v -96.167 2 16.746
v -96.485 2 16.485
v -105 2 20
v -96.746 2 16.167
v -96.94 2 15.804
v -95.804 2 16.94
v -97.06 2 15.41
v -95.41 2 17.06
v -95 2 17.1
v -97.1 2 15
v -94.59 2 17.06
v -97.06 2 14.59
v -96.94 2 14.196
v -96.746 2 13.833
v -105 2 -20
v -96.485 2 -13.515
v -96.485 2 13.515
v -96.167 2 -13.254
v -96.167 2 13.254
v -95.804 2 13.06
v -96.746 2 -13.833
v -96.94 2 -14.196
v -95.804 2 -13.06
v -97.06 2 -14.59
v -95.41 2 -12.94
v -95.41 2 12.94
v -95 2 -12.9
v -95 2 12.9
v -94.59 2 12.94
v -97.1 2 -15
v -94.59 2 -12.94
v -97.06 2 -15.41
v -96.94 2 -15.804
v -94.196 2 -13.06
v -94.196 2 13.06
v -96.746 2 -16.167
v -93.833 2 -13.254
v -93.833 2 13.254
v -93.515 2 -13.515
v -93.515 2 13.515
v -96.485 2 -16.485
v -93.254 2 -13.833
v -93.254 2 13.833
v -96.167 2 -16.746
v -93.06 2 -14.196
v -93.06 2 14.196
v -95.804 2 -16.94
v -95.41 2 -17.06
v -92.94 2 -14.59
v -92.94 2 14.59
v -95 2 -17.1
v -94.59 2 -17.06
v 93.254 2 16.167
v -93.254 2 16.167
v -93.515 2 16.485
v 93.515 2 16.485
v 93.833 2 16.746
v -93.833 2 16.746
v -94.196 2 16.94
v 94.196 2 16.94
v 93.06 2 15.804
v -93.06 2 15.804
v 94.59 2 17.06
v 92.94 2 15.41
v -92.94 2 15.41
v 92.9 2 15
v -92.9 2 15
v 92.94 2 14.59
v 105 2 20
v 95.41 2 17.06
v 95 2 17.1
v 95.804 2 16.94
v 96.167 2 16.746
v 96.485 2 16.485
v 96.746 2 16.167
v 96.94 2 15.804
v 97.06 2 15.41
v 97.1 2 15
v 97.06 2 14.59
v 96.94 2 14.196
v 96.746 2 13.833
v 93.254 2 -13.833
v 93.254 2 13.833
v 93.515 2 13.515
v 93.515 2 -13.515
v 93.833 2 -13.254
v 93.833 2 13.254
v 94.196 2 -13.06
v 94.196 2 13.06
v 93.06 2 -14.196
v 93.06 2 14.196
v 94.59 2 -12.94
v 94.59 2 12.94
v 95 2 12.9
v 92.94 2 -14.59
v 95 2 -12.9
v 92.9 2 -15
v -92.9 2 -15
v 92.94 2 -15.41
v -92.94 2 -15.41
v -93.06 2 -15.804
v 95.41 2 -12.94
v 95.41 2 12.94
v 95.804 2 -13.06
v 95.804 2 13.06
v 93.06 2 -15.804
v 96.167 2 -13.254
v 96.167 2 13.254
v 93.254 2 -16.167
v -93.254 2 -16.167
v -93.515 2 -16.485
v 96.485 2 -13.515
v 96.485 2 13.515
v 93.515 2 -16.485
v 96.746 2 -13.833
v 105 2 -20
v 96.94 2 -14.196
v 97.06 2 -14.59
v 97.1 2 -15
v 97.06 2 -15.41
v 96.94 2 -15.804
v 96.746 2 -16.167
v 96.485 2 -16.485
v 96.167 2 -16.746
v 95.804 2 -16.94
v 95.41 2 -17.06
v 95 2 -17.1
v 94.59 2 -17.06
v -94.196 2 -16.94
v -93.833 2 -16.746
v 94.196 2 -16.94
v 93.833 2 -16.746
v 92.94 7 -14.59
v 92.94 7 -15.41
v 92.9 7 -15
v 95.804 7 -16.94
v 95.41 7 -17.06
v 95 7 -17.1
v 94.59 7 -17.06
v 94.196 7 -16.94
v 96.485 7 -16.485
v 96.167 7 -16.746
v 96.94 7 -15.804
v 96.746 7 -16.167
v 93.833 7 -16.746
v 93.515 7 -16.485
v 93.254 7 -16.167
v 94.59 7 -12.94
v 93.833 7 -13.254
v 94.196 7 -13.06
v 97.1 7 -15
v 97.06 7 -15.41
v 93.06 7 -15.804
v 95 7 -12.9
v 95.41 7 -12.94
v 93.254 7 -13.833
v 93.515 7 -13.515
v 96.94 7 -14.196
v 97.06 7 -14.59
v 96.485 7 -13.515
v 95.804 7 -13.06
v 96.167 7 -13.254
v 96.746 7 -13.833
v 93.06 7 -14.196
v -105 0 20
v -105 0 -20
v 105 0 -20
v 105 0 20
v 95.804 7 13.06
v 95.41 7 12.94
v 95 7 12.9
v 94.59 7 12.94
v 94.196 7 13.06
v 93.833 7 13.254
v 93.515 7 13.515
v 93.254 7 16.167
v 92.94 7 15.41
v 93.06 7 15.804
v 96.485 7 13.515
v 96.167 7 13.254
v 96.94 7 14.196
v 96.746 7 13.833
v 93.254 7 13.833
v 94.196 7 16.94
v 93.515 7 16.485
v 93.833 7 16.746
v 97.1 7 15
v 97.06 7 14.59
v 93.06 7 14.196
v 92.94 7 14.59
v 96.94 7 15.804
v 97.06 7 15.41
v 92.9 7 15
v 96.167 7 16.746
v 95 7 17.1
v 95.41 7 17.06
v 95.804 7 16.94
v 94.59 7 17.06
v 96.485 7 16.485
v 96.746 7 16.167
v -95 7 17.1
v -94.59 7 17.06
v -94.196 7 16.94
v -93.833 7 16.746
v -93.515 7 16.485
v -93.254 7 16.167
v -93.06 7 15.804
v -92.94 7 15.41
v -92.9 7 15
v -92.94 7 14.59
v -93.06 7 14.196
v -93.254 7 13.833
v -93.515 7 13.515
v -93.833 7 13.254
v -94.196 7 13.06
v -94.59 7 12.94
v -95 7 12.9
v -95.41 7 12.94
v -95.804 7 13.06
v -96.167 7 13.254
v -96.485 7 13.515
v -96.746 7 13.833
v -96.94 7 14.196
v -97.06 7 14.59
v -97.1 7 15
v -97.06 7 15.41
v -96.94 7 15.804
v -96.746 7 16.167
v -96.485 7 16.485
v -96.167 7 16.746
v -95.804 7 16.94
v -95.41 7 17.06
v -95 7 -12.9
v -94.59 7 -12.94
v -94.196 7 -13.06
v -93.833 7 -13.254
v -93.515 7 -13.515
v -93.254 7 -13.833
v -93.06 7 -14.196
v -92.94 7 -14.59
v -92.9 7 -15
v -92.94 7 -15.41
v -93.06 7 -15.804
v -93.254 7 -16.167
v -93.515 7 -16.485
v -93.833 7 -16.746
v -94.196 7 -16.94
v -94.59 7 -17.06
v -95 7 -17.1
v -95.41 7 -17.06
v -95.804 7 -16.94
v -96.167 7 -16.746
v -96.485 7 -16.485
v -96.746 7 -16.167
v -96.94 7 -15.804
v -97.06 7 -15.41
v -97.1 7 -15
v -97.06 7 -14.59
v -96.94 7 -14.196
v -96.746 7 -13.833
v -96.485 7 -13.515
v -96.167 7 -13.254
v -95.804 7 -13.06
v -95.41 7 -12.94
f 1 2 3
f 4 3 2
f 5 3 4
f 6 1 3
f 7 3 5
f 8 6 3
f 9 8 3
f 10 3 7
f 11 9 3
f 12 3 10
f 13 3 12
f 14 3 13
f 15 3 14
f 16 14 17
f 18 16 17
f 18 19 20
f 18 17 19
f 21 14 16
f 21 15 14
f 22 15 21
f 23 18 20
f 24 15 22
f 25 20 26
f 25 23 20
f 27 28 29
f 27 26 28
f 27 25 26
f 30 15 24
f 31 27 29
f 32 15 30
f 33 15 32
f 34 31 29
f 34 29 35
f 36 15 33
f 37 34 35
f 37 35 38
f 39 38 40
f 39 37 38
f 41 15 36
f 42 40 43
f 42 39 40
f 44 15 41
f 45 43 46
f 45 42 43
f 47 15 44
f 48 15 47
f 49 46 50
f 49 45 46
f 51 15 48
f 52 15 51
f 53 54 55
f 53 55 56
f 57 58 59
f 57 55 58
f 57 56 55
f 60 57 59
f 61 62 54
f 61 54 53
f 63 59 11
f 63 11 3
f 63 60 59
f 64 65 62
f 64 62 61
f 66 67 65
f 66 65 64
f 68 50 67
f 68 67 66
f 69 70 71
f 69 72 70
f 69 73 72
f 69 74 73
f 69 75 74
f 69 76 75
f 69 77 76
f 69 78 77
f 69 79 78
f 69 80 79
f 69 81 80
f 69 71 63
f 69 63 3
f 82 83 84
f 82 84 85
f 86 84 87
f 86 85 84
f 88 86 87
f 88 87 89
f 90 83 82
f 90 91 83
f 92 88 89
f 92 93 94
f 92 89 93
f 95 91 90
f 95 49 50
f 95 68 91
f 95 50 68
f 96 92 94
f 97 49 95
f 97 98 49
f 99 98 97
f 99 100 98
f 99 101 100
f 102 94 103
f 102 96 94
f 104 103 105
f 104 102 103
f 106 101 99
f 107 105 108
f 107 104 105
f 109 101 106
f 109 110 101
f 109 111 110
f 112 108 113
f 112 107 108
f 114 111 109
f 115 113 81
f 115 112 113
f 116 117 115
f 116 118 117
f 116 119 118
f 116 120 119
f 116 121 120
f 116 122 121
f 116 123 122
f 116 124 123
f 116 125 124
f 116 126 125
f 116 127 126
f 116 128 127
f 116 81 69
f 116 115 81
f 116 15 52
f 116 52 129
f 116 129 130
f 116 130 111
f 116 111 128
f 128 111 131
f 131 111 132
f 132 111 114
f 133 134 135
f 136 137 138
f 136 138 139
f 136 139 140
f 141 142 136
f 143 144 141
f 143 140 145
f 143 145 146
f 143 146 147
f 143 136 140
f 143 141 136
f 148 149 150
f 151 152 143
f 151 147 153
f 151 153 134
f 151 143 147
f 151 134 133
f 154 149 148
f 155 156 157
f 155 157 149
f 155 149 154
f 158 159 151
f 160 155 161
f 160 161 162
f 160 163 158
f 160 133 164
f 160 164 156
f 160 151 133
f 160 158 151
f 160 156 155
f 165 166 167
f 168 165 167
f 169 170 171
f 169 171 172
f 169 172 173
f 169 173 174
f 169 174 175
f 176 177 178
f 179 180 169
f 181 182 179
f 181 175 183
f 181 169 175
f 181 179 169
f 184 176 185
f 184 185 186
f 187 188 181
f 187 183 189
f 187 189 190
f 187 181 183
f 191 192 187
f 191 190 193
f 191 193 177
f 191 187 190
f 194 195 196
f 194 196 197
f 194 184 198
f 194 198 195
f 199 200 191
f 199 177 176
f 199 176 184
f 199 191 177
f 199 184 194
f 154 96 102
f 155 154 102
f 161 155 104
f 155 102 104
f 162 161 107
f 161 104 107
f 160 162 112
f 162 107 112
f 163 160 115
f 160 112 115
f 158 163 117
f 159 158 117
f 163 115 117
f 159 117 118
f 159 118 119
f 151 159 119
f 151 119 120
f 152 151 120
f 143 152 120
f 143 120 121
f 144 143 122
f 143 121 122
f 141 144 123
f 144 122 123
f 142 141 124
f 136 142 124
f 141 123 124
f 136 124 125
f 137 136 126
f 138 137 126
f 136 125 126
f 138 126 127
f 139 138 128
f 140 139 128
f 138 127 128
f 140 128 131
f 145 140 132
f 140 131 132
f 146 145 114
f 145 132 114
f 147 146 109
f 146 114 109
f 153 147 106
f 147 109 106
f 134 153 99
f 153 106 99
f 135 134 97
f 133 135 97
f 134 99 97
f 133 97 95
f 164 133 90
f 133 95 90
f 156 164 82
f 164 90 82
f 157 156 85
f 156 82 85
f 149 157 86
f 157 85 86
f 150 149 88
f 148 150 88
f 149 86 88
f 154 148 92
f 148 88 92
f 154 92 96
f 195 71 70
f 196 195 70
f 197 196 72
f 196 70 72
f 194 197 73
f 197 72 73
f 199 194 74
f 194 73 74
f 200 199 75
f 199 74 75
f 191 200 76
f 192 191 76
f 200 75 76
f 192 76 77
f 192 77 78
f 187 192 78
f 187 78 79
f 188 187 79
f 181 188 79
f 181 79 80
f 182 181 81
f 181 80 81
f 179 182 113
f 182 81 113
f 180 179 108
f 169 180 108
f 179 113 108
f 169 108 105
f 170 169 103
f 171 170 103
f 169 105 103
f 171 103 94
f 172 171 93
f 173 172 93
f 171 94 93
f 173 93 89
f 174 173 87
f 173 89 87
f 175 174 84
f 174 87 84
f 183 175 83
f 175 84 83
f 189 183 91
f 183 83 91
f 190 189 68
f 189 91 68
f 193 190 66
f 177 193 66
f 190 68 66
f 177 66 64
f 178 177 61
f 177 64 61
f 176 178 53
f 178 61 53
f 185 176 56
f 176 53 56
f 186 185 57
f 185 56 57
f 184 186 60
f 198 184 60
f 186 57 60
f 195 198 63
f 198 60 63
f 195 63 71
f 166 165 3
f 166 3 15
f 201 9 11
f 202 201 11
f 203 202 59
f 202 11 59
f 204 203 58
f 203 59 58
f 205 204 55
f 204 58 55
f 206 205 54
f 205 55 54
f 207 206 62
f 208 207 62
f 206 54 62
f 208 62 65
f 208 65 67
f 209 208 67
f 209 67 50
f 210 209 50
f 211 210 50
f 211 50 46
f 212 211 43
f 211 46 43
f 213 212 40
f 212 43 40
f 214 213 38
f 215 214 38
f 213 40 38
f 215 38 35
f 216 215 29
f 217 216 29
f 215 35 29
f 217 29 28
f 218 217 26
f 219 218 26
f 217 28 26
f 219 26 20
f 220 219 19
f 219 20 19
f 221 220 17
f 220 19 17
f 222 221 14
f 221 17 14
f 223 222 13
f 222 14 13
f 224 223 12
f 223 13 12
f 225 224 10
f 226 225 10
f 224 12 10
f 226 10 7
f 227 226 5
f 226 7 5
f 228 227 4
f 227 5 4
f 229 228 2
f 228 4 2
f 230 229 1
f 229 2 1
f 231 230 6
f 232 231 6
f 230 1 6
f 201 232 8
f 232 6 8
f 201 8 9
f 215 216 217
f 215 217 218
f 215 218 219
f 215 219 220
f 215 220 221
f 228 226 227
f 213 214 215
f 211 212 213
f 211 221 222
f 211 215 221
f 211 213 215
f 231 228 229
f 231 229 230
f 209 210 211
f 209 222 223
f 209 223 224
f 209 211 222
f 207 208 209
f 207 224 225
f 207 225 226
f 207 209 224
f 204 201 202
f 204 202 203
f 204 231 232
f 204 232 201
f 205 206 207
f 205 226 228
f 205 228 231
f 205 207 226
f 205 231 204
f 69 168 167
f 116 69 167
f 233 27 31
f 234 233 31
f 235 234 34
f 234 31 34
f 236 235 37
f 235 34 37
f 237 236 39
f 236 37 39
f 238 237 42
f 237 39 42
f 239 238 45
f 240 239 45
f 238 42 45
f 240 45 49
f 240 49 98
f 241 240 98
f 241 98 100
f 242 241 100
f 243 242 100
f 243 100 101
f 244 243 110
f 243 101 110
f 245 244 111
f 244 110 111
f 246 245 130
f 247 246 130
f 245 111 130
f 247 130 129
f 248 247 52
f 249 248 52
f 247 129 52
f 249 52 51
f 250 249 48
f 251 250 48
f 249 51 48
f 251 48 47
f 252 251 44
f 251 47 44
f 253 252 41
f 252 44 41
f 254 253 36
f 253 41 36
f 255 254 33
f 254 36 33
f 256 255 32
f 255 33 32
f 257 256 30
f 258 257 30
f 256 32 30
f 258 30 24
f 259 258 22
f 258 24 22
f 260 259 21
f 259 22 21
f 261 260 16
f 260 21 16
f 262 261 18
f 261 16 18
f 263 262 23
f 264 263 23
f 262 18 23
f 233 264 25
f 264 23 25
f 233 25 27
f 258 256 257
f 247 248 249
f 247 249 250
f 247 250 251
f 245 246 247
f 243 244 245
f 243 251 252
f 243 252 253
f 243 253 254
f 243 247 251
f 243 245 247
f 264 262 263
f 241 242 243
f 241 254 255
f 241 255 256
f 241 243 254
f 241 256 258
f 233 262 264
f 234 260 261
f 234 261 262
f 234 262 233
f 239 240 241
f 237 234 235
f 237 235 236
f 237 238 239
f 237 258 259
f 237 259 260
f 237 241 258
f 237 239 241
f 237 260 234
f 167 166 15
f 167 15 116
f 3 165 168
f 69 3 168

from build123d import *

# Parameters (mm, degrees)
SKETCH_1_W      = 210
SKETCH_1_H      = 40
EXTRUDE_1_DEPTH = 2
SKETCH_2_R      = 2.1
EXTRUDE_2_DEPTH = 5


with BuildPart() as part:
    # 草图1 → 凸台-拉伸1 (new body)
    with BuildSketch(Plane(origin=(0, 0, 0), x_dir=(1, 0, 0), z_dir=(0, 1, 0))):
        Rectangle(SKETCH_1_W, SKETCH_1_H)
    extrude(amount=EXTRUDE_1_DEPTH)

    # 草图2 → 凸台-拉伸2 (add)
    with BuildSketch(Plane(origin=(0, 2, 0), x_dir=(1, 0, 0), z_dir=(0, 1, 0))):
        with Locations(Location((95, -15, 0), (0, 0, 270))):
            Circle(SKETCH_2_R)
        with Locations(Location((95, 15, 0), (0, 0, 270))):
            Circle(SKETCH_2_R)
        with Locations(Location((-95, 15, 0), (0, 0, 270))):
            Circle(SKETCH_2_R)
        with Locations(Location((-95, -15, 0), (0, 0, 270))):
            Circle(SKETCH_2_R)
    extrude(amount=EXTRUDE_2_DEPTH)


solid = part.part
